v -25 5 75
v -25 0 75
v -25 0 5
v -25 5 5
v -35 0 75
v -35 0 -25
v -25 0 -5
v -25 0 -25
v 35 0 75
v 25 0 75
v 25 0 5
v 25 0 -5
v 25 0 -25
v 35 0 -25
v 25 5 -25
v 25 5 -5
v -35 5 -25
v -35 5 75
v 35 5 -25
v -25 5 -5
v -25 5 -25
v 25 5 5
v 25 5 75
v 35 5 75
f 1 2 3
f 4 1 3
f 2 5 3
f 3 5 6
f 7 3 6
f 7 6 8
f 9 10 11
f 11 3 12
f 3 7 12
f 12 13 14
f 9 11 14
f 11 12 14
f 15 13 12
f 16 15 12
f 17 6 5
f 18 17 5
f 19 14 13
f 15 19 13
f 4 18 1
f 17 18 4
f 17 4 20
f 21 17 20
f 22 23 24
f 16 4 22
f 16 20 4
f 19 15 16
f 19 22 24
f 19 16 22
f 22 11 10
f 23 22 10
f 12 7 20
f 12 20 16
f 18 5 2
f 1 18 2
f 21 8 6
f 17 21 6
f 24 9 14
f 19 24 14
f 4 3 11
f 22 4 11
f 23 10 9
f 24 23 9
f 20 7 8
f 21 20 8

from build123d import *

# Parameters (mm, degrees)
ESQUISSE1_W        = 50
ESQUISSE1_H        = 10
BOSS_EXTRU_1_DEPTH = 5


with BuildPart() as part:
    # Esquisse1 → Boss.-Extru.1 (new body)
    with BuildSketch(Plane(origin=(0, 0, 0), x_dir=(1, 0, 0), z_dir=(0, 1, 0))):
        Polygon((-25, -75), (-25, -5), (-25, 5), (-25, 25), (-35, 25), (-35, -75), align=None)
        Rectangle(ESQUISSE1_W, ESQUISSE1_H)
        Polygon((25, 5), (25, -5), (25, -75), (35, -75), (35, 25), (25, 25), align=None)
    extrude(amount=BOSS_EXTRU_1_DEPTH)


solid = part.part
